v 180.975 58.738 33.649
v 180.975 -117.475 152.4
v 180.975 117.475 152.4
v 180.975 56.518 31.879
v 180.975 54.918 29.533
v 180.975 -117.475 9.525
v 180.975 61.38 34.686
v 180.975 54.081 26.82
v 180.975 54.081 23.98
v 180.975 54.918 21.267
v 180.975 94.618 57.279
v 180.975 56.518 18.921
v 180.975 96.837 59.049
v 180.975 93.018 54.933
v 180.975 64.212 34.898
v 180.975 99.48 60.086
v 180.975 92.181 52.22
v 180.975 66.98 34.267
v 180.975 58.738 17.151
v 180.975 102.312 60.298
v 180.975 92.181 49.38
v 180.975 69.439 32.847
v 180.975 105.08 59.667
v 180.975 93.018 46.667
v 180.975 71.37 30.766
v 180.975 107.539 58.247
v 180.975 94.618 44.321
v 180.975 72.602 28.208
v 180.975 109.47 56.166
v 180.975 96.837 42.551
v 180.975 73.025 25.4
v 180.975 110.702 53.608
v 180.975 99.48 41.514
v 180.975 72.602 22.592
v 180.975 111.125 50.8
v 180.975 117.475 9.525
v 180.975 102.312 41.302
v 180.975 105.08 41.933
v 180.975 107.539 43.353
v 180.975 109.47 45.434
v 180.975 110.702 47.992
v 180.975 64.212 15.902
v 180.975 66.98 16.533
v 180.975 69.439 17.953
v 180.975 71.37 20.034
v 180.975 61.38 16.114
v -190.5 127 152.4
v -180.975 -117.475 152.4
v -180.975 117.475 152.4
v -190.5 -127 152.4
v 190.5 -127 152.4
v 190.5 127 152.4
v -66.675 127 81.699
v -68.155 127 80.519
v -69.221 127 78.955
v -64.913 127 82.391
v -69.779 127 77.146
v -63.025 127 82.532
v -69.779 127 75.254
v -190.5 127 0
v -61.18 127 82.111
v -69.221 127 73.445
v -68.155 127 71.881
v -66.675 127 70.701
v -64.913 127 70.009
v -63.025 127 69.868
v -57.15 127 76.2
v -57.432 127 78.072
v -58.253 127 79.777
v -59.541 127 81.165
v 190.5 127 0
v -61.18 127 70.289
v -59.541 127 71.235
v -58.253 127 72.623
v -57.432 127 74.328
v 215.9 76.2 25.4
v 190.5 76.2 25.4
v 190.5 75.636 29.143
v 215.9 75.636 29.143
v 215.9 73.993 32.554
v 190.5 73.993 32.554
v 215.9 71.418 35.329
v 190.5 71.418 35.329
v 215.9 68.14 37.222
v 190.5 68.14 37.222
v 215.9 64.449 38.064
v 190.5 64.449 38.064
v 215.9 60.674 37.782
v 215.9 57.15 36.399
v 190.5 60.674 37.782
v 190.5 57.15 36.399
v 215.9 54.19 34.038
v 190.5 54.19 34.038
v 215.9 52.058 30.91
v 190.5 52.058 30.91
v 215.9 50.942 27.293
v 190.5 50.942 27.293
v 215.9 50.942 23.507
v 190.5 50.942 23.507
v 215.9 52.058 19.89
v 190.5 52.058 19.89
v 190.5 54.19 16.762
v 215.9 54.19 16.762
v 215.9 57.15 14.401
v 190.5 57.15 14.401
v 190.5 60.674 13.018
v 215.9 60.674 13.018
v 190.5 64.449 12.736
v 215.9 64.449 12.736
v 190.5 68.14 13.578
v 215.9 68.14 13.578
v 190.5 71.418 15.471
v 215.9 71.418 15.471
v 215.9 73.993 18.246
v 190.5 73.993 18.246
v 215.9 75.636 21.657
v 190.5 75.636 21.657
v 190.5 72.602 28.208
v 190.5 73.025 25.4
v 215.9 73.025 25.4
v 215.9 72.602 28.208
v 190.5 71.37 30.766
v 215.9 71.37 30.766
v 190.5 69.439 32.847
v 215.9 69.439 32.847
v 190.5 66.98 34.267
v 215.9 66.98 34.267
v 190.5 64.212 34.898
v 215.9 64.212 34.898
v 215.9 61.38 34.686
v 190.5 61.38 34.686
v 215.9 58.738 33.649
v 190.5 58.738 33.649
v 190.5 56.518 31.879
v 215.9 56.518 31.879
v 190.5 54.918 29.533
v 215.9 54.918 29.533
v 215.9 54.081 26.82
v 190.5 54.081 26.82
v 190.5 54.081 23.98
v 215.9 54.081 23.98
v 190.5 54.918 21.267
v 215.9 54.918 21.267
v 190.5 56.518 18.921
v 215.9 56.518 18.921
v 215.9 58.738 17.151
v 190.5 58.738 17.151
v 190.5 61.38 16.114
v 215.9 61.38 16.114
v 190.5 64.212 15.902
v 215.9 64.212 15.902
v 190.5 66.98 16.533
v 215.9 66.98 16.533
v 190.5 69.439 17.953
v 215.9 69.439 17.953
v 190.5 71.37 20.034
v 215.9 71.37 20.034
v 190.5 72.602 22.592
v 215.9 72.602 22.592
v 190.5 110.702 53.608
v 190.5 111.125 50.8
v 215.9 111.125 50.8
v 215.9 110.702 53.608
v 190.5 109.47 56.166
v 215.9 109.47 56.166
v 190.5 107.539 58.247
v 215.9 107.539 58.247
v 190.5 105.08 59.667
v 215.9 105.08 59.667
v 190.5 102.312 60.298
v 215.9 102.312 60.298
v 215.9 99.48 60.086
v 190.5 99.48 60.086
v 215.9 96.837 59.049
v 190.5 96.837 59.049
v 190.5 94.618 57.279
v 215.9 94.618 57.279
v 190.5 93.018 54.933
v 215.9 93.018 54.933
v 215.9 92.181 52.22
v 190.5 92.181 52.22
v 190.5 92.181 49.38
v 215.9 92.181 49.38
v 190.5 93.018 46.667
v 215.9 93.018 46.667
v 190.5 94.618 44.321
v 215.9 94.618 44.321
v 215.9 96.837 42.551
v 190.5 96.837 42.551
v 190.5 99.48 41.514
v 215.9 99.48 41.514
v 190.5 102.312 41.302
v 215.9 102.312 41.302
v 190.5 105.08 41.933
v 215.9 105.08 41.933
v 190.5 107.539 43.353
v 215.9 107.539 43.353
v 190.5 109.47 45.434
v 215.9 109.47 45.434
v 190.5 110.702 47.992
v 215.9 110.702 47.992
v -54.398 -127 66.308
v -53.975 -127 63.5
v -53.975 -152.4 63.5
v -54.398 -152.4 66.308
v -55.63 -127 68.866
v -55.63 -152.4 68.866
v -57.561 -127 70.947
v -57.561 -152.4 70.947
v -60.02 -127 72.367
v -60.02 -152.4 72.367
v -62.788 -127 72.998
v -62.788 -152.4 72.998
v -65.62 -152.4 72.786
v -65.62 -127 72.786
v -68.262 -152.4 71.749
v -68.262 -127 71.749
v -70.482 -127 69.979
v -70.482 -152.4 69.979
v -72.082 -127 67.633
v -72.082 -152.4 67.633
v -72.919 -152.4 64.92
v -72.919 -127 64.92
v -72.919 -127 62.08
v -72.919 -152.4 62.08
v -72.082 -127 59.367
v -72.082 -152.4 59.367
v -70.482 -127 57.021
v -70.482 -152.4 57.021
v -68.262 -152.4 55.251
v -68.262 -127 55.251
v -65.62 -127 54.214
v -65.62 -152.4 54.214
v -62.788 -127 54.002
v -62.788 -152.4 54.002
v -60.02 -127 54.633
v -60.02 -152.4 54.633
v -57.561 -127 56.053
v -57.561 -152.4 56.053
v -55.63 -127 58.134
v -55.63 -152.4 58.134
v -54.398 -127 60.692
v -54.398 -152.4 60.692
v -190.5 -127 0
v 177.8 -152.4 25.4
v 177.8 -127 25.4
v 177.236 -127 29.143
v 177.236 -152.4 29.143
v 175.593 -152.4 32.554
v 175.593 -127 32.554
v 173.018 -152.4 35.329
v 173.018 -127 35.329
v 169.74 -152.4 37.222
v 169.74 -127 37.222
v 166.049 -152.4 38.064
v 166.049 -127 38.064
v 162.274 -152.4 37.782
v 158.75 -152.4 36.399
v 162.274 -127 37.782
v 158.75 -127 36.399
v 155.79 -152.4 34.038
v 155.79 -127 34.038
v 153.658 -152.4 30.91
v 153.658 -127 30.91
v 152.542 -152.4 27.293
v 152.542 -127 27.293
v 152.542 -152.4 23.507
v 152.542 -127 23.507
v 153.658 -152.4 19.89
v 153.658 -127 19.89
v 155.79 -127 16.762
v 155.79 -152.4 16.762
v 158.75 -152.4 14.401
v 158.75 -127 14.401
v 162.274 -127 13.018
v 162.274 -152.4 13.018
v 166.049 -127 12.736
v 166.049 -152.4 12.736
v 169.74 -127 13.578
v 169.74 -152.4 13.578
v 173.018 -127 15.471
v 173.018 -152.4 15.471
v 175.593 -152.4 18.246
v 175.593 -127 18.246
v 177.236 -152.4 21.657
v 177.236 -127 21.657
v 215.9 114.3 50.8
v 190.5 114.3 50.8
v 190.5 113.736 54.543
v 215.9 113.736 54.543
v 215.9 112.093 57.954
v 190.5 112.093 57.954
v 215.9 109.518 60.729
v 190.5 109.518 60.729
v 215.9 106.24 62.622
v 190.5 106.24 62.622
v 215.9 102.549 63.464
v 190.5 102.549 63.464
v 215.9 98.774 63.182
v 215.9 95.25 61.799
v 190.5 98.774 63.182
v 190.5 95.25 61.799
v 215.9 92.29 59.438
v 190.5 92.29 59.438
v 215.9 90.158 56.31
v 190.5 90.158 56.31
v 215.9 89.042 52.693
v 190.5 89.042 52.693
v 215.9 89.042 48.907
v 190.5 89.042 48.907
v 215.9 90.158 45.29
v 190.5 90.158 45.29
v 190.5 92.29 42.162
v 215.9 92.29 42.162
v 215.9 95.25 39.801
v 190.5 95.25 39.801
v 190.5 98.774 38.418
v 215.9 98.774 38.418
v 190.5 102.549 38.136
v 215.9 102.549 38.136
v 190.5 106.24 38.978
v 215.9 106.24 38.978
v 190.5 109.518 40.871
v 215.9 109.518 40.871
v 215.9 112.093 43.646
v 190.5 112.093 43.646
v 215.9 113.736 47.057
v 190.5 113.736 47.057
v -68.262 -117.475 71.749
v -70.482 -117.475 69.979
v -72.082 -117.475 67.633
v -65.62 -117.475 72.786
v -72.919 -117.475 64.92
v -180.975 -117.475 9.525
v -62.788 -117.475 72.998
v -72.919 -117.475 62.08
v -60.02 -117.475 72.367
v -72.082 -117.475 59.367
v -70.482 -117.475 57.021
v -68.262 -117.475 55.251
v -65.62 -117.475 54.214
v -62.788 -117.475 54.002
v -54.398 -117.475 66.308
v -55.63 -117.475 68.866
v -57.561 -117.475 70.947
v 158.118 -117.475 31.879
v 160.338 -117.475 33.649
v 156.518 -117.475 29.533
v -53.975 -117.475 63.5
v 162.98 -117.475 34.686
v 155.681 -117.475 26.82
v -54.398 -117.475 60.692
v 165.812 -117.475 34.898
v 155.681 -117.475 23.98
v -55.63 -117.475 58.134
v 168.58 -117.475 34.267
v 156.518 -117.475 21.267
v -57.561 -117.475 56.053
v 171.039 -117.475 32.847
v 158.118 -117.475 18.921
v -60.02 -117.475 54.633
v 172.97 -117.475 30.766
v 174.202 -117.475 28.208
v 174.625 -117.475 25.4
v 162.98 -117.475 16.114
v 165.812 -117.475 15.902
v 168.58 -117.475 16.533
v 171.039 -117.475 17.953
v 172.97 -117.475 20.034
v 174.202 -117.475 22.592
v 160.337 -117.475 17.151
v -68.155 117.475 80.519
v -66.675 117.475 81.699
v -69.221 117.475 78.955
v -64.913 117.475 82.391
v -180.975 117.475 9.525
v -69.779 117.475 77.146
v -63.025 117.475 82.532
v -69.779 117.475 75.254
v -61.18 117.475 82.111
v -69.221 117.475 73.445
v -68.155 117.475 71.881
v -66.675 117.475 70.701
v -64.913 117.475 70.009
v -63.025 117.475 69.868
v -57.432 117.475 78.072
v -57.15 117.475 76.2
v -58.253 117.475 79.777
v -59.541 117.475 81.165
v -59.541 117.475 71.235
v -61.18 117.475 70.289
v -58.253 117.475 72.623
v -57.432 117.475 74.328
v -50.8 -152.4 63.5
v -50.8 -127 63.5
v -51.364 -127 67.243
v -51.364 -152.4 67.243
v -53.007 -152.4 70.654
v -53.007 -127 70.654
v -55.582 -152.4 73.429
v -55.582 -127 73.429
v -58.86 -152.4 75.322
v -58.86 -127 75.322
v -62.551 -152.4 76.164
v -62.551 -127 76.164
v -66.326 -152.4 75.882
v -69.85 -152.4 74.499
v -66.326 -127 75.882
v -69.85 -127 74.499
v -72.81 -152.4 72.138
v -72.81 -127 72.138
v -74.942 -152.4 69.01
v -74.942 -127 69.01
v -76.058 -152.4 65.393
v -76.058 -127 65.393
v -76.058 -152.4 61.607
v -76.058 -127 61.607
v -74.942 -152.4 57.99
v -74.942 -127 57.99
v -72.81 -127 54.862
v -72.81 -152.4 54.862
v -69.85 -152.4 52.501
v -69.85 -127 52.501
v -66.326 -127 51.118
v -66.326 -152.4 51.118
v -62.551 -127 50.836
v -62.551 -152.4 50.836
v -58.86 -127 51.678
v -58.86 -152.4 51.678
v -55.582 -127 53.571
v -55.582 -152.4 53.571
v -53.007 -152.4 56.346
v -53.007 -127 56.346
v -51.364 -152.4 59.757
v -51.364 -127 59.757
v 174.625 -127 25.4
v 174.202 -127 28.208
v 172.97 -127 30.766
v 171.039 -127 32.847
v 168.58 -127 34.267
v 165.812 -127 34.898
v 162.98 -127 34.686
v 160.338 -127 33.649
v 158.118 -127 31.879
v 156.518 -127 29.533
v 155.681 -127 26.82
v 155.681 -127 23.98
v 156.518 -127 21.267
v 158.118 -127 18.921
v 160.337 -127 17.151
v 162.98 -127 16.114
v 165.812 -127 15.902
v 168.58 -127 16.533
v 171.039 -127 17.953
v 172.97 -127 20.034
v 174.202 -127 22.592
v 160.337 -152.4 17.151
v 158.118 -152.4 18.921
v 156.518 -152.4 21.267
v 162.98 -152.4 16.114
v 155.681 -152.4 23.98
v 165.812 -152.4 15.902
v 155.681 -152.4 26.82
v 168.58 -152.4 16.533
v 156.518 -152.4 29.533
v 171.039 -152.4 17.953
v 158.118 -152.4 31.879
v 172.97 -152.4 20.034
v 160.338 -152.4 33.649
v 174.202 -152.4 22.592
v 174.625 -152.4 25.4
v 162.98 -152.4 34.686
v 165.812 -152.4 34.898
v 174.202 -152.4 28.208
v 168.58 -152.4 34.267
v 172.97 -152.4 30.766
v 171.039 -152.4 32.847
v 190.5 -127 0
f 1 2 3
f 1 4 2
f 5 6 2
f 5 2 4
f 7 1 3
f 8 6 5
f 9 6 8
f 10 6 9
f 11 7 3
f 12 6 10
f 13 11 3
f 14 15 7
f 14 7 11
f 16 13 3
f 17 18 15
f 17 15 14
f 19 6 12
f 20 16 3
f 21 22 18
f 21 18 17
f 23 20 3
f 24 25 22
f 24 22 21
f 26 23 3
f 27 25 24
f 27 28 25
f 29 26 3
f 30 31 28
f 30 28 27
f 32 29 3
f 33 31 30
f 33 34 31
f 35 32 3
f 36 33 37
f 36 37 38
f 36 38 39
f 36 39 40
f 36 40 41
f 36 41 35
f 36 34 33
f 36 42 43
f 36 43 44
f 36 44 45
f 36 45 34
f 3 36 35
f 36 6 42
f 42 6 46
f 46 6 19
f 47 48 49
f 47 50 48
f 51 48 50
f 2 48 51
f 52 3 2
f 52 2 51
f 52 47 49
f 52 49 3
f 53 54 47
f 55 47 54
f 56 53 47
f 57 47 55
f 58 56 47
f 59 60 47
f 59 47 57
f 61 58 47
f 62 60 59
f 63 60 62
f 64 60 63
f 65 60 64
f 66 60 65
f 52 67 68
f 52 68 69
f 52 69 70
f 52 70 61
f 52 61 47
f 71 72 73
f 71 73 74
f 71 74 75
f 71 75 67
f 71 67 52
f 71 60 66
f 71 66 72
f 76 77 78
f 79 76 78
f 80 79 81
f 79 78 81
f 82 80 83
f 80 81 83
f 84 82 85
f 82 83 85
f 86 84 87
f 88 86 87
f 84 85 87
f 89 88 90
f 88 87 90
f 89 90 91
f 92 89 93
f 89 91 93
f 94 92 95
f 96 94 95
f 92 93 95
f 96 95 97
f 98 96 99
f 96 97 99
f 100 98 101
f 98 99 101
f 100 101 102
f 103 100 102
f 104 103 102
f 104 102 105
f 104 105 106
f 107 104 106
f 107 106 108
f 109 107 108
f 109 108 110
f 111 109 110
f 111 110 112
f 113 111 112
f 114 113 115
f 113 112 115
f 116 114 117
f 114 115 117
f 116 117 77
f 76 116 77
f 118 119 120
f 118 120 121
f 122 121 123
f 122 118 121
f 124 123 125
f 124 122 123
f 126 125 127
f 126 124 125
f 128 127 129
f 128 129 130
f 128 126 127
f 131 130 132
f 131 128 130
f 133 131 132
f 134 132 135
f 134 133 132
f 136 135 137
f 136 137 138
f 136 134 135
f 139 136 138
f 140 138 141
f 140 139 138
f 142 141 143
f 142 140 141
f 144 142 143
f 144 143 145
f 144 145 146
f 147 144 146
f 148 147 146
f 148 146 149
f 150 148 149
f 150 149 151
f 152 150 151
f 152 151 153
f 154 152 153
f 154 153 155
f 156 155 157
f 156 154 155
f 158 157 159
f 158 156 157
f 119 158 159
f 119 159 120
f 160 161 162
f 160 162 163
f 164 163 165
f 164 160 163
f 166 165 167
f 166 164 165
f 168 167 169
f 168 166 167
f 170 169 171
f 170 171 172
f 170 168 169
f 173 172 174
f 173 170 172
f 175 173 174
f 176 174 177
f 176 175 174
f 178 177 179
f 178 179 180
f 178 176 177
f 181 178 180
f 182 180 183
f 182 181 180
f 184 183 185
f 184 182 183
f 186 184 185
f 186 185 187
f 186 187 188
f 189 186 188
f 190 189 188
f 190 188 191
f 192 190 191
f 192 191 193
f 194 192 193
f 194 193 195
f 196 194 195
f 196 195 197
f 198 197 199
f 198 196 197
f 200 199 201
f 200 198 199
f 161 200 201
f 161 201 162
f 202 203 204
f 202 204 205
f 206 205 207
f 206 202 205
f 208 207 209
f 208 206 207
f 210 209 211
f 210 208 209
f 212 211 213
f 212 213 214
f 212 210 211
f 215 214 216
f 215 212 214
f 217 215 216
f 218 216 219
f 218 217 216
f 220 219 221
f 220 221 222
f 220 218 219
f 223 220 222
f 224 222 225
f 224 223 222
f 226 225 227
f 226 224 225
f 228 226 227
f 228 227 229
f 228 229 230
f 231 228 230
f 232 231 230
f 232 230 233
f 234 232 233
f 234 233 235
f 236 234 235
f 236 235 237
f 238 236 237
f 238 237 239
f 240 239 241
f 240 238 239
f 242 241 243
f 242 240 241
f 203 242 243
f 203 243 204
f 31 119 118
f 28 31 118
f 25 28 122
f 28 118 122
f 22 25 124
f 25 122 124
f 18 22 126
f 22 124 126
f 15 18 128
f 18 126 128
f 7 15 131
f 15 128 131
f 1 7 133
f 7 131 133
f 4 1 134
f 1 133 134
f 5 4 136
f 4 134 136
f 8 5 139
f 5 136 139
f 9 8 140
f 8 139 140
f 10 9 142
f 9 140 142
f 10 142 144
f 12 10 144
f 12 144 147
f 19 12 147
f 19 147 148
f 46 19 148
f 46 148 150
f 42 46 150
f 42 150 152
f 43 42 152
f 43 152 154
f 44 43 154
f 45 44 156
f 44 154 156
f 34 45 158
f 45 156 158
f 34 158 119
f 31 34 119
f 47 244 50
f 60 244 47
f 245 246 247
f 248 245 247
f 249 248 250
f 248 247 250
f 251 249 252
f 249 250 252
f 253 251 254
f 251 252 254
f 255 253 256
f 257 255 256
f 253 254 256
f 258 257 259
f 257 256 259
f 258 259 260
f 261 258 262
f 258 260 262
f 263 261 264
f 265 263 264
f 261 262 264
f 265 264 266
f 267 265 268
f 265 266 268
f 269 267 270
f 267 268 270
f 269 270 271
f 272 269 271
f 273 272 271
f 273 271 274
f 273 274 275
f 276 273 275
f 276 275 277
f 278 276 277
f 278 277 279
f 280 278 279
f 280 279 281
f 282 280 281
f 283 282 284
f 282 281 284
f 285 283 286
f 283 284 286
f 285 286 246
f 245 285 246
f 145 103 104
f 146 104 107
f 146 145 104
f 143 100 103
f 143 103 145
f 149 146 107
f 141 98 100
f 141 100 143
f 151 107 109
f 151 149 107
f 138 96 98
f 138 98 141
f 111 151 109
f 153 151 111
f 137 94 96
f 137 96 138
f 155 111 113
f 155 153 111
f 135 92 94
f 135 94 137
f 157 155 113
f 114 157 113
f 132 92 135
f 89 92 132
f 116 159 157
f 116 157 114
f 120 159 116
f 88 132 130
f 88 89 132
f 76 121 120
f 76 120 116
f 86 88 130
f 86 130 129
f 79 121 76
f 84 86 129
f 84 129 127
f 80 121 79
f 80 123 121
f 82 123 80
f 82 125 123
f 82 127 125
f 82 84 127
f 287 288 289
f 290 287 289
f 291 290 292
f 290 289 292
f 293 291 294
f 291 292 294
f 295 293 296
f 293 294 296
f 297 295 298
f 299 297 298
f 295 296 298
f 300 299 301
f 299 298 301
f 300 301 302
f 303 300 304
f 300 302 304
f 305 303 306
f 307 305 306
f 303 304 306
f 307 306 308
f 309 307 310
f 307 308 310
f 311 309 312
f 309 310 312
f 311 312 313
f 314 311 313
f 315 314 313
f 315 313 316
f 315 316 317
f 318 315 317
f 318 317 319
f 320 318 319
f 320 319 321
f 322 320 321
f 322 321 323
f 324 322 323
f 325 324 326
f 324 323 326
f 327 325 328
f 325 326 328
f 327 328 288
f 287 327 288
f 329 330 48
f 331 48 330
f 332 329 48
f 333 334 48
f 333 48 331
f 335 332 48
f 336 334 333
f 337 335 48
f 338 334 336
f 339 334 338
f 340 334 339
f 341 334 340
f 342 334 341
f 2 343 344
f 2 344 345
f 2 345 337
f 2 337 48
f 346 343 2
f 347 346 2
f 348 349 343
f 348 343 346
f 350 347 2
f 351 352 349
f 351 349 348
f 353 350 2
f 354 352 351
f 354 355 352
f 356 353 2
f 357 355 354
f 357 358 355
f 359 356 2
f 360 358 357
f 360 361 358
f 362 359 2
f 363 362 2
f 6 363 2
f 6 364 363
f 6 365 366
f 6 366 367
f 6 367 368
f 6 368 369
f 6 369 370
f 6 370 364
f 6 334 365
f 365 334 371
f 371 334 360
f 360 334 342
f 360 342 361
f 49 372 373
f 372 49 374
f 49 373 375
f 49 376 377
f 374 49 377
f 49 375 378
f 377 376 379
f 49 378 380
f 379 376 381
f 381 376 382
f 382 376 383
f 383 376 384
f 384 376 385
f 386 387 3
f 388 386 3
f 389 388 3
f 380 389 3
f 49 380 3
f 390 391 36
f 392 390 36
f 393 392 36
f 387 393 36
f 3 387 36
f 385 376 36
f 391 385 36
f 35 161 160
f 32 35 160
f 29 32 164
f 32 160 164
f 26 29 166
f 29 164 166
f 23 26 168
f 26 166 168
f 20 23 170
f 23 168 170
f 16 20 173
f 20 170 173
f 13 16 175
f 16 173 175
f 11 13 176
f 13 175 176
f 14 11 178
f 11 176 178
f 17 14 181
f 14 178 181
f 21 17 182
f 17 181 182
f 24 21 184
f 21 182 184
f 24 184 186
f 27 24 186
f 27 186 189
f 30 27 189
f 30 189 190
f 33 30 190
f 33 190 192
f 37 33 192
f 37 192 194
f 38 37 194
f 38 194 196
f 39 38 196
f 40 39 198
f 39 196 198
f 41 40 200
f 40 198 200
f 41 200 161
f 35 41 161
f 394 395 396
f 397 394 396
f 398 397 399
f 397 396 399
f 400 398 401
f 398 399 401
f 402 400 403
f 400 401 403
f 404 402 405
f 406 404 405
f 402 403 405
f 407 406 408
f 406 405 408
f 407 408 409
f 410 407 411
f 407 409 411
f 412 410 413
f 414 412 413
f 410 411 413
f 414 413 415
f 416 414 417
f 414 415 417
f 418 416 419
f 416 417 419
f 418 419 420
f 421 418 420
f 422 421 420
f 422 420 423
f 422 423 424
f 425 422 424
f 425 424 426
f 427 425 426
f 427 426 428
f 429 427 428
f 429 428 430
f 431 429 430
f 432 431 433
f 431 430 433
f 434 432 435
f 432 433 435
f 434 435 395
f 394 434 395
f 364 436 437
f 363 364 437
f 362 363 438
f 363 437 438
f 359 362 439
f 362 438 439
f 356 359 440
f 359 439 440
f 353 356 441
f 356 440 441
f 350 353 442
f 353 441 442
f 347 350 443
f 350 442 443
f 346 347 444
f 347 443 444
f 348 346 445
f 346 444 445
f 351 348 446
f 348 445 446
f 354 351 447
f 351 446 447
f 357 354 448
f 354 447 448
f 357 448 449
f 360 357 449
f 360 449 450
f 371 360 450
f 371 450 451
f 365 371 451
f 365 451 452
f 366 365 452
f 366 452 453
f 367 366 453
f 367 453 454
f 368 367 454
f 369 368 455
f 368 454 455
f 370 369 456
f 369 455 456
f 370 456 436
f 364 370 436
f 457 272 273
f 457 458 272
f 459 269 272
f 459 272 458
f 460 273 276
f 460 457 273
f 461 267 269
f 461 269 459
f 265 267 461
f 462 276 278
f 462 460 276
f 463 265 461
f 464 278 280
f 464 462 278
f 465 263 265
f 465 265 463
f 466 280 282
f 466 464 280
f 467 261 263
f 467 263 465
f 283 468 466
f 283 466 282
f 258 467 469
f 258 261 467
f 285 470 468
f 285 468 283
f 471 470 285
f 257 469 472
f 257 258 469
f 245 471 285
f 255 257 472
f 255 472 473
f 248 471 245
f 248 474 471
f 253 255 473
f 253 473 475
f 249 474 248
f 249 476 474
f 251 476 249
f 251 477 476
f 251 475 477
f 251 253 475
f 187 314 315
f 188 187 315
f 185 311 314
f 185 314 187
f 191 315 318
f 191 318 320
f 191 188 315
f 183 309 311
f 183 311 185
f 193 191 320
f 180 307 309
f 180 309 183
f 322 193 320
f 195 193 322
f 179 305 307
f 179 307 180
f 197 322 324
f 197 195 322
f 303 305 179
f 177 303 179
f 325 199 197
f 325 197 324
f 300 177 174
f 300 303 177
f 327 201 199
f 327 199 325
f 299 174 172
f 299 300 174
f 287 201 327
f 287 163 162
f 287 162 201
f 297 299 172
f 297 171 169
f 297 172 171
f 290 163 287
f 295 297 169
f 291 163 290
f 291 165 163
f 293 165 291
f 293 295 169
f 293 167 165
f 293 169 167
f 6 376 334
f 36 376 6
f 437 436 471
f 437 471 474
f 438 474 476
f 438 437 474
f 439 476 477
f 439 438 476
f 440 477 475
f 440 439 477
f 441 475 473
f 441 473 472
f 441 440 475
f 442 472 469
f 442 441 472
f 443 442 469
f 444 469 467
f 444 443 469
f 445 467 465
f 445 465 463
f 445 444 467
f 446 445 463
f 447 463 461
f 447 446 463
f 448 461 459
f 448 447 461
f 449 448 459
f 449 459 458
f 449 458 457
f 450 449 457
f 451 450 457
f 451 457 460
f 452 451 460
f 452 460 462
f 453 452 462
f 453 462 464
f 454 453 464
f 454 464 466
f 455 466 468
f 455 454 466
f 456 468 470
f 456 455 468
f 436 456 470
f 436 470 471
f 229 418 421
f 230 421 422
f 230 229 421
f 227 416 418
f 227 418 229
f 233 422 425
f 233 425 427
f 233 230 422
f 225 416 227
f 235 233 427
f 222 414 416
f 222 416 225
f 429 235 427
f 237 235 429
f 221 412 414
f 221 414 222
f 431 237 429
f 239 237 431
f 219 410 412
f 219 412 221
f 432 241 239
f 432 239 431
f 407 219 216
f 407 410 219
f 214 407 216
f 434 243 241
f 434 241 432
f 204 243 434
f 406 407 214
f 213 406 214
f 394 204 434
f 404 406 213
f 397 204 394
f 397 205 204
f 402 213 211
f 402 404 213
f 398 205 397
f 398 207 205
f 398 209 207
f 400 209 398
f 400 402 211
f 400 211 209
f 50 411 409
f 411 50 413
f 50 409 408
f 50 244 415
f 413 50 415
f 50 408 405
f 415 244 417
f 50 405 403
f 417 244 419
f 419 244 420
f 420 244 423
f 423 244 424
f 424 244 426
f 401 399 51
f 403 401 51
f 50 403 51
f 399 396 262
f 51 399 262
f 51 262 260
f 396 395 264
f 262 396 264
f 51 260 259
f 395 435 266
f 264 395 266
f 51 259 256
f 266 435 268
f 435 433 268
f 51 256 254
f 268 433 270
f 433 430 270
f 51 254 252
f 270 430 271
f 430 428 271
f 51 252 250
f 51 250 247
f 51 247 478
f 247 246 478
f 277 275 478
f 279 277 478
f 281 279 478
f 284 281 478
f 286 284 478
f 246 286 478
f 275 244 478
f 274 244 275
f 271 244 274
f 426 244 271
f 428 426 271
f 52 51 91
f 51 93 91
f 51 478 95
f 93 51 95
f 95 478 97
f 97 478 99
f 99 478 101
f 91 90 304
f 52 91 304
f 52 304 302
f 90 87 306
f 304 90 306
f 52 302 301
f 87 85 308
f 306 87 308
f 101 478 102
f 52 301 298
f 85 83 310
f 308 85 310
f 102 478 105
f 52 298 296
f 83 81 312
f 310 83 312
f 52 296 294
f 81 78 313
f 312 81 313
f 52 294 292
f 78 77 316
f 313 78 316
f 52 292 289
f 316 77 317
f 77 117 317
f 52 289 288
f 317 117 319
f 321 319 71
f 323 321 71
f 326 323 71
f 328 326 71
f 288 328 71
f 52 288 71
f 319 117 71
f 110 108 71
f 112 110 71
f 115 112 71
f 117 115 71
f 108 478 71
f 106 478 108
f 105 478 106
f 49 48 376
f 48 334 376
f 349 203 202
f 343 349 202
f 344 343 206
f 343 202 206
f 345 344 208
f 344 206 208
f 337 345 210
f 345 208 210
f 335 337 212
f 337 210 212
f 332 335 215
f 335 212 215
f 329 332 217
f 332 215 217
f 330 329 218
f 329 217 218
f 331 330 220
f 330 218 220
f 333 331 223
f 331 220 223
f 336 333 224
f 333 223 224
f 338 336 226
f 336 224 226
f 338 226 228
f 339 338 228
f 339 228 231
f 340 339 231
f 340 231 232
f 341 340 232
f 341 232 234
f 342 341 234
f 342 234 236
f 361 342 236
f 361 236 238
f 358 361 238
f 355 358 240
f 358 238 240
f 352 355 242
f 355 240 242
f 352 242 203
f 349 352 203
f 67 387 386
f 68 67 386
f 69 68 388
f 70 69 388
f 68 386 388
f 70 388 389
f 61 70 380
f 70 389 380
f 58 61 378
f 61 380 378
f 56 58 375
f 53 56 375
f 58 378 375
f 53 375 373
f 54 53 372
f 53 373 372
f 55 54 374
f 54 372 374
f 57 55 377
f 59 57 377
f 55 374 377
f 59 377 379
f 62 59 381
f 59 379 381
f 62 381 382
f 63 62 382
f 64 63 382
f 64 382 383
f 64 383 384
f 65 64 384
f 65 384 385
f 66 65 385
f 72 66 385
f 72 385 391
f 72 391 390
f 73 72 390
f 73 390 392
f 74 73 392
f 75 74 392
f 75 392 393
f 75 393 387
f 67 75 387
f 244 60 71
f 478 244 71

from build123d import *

# Parameters (mm, degrees)
F0_W      = 381
F0_H      = 254
F1_DEPTH  = 152.4
F2_T      = -9.525
F3_R      = 12.7
F3_R_2    = 9.525
F4_DEPTH  = 25.4
F5_R      = 9.525
F6_DEPTH  = 9.525
F7_R      = 12.7
F7_R_2    = 9.525
F8_DEPTH  = 25.4
F9_R      = 9.525
F10_DEPTH = 9.525
F11_R     = 6.35
F12_DEPTH = 25.4


with BuildPart() as f1:
    # F0 (on Top) → F1 (new body)
    with BuildSketch(Plane.XY):
        Rectangle(F0_W, F0_H)
    extrude(amount=F1_DEPTH)

    # F2
    f2_openings = [f1.faces().sort_by_distance(p)[0] for p in [
        (0, 0, 152.4),
    ]]
    offset(amount=F2_T, openings=f2_openings)

    # F3 (on face) → F4 (join)
    with BuildSketch(Plane.YZ.offset(190.5)):
        with Locations((63.5, 25.4)):
            Circle(F3_R)
        with Locations((63.5, 25.4)):
            Circle(F3_R_2, mode=Mode.SUBTRACT)
        with Locations((101.6, 50.8)):
            Circle(F3_R)
        with Locations((101.6, 50.8)):
            Circle(F3_R_2, mode=Mode.SUBTRACT)
    extrude(amount=F4_DEPTH)

    # F5 (on face) → F6 (cut, through all)
    with BuildSketch(Plane.YZ.offset(190.5)):
        with Locations((63.5, 25.4)):
            Circle(F5_R)
        with Locations((101.6, 50.8)):
            Circle(F5_R)
    extrude(amount=-F6_DEPTH, mode=Mode.SUBTRACT)

    # F7 (on face) → F8 (join)
    with BuildSketch(Plane.XZ.offset(127)):
        with Locations((-63.5, 63.5)):
            Circle(F7_R)
        with Locations((-63.5, 63.5)):
            Circle(F7_R_2, mode=Mode.SUBTRACT)
        with Locations((165.1, 25.4)):
            Circle(F7_R)
        with Locations((165.1, 25.4)):
            Circle(F7_R_2, mode=Mode.SUBTRACT)
    extrude(amount=F8_DEPTH)

    # F9 (on face) → F10 (cut, through all)
    with BuildSketch(Plane.XZ.offset(127)):
        with Locations((-63.5, 63.5)):
            Circle(F9_R)
        with Locations((165.1, 25.4)):
            Circle(F9_R)
    extrude(amount=-F10_DEPTH, mode=Mode.SUBTRACT)

    # F11 (on face) → F12 (cut)
    with BuildSketch(Plane.XZ.offset(-117.475)):
        with Locations((-63.5, 76.2)):
            Circle(F11_R)
    extrude(amount=-F12_DEPTH, mode=Mode.SUBTRACT)


solid = f1.part
